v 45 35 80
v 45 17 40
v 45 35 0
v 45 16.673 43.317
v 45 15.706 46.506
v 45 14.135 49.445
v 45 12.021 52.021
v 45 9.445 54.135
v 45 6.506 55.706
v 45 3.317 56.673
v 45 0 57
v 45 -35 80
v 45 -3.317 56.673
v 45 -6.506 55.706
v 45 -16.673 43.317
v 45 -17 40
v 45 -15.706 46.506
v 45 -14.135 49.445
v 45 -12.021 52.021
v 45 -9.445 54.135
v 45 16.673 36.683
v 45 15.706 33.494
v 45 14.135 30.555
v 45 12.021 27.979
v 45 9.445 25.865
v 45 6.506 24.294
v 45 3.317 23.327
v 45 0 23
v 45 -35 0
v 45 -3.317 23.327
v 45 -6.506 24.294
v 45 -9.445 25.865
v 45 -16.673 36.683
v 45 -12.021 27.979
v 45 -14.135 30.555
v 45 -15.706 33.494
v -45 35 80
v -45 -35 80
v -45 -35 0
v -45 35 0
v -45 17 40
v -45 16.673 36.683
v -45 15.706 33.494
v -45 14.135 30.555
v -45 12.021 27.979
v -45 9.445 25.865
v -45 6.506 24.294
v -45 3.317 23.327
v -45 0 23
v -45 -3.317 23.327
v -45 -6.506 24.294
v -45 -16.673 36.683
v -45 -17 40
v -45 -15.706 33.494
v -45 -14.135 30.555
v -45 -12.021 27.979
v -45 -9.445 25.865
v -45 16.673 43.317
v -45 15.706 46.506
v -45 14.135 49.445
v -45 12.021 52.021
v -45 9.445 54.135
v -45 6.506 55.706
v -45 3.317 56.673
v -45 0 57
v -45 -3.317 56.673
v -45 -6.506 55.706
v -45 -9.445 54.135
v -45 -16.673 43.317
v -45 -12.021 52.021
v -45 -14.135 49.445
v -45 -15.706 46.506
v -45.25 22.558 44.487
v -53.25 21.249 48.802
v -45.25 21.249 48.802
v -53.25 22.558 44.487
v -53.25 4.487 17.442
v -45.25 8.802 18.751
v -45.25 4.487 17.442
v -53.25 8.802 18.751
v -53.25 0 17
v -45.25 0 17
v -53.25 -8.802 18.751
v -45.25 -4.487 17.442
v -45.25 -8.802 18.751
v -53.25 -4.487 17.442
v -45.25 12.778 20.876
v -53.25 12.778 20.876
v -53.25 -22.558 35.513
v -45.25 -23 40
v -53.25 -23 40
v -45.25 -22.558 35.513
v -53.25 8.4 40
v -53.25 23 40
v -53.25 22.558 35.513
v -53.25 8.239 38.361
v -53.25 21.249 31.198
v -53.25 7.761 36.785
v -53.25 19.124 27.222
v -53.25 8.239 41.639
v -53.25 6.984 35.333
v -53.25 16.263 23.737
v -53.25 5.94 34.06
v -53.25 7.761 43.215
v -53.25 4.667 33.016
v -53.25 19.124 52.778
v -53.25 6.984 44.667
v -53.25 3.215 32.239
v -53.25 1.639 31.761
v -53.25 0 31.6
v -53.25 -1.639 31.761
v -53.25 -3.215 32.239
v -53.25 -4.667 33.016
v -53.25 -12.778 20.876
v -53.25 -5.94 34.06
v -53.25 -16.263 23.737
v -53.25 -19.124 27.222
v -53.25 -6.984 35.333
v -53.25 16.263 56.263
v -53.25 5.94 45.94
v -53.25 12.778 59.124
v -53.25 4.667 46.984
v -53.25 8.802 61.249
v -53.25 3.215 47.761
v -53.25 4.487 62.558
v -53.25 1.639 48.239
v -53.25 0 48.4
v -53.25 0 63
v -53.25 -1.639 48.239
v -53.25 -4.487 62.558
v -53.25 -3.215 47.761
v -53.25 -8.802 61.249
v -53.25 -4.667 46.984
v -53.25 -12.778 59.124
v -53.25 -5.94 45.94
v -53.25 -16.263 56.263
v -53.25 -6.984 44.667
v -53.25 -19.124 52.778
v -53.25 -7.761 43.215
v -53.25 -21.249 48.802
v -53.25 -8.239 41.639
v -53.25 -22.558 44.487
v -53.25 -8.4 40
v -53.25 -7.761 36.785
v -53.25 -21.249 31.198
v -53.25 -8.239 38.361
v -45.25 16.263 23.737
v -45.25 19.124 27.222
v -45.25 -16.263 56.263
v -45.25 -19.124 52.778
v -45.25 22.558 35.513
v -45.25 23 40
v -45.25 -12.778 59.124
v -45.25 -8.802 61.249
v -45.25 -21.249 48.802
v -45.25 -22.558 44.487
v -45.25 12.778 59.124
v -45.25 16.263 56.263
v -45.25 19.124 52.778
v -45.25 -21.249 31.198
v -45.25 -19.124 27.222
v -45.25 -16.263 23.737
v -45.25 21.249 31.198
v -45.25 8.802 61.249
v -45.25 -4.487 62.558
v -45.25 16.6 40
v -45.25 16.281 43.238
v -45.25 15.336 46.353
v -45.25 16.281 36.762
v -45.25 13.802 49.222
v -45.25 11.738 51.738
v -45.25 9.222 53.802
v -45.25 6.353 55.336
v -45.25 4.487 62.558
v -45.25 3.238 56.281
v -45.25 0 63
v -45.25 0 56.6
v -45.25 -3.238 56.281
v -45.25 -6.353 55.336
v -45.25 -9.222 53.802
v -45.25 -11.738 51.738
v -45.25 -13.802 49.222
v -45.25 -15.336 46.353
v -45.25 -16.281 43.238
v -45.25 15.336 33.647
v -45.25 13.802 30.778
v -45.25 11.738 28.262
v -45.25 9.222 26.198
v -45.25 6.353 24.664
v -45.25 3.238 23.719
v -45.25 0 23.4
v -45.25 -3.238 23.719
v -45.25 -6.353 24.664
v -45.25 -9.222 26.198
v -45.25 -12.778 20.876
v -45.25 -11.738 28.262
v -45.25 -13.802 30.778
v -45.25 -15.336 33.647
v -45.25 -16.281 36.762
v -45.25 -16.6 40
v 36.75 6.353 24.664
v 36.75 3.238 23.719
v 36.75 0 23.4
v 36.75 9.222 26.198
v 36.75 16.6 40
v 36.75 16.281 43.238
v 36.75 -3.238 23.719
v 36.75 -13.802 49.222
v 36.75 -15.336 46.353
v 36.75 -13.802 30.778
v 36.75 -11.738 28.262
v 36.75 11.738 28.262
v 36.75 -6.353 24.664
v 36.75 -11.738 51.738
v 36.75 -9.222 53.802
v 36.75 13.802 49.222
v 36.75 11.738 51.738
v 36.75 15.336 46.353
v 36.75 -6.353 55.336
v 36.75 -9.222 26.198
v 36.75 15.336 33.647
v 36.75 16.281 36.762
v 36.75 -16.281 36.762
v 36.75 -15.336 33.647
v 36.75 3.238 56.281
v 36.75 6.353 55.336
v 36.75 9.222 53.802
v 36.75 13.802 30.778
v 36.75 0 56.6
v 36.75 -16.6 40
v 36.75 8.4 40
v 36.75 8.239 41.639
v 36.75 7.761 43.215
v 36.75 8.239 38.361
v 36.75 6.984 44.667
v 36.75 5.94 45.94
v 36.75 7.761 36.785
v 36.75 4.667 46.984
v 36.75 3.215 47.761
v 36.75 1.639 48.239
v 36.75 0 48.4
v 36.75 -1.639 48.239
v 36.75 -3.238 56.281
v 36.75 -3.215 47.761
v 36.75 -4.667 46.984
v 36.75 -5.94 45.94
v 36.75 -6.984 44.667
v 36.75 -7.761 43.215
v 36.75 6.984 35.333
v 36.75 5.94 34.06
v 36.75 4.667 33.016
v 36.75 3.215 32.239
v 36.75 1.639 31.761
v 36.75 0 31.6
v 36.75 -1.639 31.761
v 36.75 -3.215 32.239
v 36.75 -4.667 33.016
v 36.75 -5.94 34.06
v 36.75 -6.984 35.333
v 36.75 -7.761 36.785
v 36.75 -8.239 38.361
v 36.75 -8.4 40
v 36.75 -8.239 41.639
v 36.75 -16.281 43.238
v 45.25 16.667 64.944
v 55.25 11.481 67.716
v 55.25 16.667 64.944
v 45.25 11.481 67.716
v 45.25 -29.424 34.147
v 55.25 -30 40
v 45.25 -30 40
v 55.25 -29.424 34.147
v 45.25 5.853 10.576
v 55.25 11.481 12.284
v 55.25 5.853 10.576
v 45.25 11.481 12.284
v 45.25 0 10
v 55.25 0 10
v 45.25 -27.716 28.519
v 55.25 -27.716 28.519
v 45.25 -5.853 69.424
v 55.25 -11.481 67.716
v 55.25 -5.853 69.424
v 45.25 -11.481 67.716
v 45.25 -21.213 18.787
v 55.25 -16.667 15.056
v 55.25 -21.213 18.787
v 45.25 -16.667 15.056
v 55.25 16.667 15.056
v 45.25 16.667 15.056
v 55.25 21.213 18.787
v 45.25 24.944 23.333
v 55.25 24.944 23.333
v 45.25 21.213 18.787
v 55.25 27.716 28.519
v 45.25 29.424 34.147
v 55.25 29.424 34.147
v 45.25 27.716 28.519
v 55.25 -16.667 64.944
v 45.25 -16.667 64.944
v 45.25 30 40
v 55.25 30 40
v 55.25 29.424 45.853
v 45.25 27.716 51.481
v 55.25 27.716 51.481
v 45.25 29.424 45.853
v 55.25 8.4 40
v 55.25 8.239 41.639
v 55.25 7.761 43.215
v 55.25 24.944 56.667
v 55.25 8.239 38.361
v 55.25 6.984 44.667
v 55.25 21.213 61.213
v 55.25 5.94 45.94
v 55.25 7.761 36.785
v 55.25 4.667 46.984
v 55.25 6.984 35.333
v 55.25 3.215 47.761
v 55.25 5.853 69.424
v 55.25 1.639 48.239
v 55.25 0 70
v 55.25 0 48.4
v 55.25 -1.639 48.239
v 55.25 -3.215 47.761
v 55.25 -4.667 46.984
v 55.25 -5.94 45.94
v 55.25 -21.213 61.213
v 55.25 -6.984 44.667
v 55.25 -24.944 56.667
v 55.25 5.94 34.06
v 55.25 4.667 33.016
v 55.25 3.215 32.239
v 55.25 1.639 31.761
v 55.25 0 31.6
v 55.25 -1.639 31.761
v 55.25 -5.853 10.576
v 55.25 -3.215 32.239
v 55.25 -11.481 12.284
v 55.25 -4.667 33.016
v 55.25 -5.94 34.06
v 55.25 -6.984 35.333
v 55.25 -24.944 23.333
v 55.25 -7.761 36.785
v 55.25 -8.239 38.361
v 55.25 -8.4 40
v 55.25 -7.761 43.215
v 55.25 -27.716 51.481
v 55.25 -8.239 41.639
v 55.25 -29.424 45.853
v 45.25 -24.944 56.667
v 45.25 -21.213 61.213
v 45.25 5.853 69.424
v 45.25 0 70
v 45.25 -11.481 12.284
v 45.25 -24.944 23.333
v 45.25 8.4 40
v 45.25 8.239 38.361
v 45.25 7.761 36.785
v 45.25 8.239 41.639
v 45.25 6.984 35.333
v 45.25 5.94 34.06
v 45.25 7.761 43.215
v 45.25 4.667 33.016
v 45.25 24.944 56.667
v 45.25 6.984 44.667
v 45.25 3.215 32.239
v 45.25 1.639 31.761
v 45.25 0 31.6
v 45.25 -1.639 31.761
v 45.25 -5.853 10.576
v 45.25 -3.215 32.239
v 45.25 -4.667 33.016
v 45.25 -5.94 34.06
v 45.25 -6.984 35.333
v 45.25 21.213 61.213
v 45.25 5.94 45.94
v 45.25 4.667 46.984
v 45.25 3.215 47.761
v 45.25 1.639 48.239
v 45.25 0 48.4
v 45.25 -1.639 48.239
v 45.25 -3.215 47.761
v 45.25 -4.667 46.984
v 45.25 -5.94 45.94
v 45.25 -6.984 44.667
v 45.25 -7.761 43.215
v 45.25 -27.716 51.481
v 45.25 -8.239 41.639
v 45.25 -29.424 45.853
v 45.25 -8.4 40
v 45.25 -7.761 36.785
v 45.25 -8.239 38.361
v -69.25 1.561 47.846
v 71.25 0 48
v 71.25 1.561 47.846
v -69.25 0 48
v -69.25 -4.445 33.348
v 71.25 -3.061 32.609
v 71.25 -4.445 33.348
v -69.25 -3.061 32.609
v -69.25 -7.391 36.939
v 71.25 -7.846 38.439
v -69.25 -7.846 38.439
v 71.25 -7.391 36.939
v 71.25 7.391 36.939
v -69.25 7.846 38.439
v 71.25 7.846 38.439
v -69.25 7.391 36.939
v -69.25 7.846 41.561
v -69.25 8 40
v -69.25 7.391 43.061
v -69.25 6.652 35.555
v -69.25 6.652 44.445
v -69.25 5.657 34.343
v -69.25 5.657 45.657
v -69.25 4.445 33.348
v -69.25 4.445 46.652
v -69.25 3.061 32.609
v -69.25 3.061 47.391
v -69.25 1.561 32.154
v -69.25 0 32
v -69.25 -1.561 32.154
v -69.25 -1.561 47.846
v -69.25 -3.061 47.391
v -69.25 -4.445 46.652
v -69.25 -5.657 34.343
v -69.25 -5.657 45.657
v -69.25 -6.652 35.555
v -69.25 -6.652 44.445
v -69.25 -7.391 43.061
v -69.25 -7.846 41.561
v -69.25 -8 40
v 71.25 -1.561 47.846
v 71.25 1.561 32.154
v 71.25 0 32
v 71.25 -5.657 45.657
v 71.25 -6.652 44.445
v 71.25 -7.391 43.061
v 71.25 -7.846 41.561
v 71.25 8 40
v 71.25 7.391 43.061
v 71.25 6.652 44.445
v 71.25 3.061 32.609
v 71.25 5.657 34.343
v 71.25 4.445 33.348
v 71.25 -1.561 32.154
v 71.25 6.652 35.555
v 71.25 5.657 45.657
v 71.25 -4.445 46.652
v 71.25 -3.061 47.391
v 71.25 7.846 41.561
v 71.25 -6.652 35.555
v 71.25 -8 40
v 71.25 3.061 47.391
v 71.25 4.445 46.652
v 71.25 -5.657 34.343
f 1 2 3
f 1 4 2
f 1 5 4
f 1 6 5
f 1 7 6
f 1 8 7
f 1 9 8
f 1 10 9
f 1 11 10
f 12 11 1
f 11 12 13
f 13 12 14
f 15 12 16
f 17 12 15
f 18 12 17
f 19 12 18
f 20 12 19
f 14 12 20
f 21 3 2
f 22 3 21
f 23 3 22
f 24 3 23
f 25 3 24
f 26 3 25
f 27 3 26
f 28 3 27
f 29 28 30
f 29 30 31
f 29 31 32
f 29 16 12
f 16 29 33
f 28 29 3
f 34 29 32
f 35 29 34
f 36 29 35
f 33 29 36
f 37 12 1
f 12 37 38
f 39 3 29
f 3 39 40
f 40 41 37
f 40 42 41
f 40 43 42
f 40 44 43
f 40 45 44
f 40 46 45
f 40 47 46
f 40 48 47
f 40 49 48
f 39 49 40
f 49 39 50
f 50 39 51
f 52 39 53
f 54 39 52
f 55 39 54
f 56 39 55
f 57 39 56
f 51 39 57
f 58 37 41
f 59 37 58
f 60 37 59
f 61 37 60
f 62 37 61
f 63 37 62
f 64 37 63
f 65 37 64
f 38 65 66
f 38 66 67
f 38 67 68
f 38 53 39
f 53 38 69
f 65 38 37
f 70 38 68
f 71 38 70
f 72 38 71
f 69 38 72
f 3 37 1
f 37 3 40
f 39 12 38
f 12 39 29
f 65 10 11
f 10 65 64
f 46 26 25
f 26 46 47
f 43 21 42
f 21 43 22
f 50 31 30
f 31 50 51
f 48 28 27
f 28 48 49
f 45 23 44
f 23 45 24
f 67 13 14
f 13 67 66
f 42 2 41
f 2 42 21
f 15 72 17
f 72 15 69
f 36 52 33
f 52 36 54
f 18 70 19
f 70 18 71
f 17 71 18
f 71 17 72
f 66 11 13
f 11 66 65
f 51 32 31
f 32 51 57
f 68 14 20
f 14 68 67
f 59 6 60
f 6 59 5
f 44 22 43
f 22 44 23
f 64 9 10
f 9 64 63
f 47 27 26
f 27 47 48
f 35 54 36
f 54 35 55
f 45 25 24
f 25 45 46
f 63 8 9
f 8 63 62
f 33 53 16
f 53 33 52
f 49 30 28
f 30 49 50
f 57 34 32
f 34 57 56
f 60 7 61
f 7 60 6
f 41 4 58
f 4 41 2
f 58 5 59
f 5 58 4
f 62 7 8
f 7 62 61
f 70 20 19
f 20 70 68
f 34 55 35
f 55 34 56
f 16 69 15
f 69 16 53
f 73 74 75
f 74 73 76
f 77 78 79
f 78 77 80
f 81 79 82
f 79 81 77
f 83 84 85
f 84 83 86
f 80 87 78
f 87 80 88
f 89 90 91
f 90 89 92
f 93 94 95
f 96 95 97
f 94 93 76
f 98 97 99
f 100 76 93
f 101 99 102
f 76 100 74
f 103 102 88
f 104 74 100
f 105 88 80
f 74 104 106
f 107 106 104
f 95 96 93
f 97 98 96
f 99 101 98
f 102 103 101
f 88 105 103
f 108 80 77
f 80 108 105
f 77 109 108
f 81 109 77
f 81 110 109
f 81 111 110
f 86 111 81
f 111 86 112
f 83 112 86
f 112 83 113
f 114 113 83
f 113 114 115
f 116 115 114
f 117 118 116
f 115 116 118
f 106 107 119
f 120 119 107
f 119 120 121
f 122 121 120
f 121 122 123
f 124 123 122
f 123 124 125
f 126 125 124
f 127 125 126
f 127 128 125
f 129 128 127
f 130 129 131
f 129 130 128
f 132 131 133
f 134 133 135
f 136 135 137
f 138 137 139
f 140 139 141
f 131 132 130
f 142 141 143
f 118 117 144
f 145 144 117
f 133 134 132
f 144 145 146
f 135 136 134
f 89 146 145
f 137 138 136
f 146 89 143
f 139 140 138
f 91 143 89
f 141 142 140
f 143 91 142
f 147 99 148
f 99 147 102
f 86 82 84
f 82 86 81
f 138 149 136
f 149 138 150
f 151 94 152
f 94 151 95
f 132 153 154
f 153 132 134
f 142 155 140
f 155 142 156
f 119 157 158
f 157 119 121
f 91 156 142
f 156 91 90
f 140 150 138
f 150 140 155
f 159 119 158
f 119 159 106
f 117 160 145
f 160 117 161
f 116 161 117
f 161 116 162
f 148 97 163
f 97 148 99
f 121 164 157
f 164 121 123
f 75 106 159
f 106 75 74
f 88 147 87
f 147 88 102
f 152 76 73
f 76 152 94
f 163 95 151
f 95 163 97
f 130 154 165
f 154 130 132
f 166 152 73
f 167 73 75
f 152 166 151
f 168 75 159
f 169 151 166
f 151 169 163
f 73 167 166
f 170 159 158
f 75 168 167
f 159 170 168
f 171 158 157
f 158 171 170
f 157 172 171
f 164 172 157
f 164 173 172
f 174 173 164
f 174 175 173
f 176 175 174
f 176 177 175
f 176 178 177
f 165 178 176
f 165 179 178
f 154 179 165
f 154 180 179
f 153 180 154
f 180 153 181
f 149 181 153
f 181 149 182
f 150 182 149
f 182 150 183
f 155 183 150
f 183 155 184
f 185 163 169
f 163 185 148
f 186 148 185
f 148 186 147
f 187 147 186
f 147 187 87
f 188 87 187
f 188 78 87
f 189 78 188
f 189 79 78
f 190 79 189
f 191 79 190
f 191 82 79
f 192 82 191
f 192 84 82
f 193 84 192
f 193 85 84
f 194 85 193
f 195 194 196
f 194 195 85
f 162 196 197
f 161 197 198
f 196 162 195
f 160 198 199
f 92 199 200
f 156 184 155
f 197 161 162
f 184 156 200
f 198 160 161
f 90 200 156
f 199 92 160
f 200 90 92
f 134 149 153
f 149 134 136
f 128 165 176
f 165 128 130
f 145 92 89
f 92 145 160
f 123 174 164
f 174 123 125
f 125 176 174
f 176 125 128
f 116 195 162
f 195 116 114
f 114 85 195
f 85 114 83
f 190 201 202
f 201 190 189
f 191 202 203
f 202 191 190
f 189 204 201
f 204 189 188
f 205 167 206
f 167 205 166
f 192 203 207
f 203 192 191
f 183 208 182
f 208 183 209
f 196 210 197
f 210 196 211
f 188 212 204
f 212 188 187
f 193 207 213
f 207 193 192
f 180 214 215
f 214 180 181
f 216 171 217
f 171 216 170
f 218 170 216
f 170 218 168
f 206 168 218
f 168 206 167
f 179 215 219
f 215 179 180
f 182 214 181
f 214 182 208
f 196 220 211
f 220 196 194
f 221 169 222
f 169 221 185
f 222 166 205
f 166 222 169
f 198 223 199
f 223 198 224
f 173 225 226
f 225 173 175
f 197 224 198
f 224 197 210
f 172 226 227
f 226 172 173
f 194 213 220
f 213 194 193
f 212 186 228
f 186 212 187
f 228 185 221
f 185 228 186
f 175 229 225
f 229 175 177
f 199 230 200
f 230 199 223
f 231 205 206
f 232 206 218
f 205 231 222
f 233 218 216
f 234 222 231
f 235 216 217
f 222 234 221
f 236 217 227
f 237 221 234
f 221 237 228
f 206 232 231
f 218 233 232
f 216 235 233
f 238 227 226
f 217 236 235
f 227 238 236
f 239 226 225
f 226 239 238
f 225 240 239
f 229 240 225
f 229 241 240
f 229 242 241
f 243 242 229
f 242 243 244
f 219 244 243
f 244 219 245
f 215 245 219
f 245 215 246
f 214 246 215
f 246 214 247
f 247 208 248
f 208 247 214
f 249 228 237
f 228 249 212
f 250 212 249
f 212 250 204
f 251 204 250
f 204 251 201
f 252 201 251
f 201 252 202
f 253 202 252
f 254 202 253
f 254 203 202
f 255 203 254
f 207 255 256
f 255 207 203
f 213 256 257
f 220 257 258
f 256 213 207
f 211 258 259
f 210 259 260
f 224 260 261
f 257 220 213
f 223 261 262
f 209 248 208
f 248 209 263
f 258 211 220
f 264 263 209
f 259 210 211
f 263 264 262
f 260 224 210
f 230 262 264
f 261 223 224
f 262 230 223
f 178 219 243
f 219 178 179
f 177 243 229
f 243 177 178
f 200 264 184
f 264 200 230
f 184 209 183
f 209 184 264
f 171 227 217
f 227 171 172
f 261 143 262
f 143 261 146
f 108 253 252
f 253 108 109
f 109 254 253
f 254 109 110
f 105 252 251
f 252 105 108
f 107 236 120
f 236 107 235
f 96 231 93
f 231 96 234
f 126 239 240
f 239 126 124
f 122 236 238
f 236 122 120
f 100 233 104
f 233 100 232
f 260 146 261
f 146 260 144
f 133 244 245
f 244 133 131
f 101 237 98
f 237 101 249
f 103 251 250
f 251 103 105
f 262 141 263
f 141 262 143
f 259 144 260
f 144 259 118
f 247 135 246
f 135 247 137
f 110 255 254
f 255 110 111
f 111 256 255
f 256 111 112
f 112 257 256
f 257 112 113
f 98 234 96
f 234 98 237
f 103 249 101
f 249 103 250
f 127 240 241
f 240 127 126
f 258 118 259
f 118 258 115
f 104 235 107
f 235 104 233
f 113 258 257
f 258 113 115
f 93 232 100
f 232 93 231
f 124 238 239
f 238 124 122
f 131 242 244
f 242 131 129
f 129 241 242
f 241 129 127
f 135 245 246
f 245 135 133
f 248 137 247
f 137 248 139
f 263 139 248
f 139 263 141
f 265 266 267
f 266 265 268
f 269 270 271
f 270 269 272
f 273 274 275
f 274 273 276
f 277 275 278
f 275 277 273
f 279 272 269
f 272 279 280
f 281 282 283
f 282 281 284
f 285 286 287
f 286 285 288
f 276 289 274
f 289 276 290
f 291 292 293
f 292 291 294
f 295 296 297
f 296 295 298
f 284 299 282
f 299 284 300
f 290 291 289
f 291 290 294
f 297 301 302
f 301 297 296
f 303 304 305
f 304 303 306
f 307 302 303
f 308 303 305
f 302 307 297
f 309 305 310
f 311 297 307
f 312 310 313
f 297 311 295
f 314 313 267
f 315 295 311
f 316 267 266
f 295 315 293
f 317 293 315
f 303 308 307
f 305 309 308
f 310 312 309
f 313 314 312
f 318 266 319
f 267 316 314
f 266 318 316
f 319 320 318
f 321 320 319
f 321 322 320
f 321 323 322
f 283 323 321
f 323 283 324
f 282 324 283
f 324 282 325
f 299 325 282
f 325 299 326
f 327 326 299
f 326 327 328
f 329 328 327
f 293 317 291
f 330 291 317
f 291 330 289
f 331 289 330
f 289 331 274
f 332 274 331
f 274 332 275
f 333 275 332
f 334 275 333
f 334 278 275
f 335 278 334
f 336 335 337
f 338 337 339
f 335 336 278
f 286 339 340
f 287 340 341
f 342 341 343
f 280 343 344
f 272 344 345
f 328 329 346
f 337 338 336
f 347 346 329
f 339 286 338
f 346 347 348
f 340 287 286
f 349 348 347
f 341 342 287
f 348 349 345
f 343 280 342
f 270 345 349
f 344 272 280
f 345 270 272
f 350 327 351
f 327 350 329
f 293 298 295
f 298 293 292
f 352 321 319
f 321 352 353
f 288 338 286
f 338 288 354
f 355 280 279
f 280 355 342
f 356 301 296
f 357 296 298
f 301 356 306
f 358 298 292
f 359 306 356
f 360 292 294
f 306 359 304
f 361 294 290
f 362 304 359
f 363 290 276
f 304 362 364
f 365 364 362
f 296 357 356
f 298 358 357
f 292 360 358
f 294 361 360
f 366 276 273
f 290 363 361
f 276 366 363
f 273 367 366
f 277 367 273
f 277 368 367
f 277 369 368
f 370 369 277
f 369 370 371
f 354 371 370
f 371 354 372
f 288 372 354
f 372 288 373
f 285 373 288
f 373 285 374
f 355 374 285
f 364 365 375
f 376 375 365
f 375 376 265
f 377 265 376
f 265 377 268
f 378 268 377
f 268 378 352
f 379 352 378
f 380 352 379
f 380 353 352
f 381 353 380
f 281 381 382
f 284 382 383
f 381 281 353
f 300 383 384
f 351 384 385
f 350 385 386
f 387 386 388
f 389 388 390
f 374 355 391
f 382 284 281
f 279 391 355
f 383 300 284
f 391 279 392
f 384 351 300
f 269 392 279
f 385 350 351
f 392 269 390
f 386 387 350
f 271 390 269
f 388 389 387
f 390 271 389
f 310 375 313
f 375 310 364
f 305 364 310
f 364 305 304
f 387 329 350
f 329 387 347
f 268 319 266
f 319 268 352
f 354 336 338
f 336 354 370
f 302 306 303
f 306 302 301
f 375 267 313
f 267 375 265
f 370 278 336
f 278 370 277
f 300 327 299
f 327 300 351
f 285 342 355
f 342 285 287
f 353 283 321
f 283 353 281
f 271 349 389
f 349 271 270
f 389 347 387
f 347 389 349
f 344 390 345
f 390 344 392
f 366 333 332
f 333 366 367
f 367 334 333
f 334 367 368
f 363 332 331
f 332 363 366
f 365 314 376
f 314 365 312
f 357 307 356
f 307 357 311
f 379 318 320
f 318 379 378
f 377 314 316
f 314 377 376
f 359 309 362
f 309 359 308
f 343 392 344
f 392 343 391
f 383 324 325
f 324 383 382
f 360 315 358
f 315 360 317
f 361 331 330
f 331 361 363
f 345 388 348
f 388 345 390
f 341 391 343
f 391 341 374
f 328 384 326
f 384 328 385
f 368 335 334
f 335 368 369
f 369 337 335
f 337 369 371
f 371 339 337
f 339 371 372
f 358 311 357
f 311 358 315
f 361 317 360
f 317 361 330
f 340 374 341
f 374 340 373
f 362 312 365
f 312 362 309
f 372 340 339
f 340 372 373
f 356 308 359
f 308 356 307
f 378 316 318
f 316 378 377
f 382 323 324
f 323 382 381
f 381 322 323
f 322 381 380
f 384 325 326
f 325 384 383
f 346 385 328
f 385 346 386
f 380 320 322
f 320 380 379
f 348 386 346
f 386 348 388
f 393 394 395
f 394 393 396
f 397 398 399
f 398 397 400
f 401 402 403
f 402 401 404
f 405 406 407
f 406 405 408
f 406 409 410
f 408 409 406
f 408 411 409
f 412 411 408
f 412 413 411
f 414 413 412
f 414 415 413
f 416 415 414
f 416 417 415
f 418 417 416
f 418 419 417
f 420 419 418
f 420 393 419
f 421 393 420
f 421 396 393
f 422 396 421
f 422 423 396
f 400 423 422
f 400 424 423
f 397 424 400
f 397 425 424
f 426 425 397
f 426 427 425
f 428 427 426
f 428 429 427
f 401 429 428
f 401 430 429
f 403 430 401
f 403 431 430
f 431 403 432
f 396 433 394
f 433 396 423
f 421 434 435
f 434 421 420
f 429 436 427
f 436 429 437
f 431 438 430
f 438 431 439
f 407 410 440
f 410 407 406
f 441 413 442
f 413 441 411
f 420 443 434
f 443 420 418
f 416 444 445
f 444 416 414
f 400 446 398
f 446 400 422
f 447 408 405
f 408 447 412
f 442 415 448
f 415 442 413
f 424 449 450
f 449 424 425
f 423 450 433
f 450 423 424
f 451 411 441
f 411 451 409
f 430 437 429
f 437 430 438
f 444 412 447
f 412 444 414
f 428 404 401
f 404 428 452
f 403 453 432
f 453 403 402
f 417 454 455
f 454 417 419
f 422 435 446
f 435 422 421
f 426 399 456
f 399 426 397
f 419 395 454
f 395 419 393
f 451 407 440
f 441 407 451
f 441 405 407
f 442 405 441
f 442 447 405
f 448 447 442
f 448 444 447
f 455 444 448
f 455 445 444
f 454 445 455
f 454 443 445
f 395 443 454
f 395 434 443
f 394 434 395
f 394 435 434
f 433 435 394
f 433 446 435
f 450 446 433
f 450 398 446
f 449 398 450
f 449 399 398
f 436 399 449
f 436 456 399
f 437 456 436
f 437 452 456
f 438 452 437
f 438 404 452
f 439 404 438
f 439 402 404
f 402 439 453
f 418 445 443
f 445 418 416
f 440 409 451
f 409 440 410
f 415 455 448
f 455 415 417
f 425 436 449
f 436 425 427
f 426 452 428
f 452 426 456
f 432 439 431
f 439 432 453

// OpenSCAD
$fn = 32;

// ------------------------------------------------------------------------
// Bushed housing: 90 x 70 x 80 mm housing, bushing d33.2
// Every part is its own module, assembly() places them once.
// ------------------------------------------------------------------------

// --- part 1 ---
module housing() {
  difference() {
    translate([-45, -35, 0]) cube([90, 70, 80]);
    translate([0, 0, 40]) rotate([0, 90, 0]) cylinder(h = 92, d = 34, center = true);
  }
}

// --- part 2 ---
module bushing() {
  difference() {
    union() {
      cylinder(h = 8, d = 46);
      translate([0, 0, 8]) cylinder(h = 82, d = 33.2);
    }
    translate([0, 0, -1]) cylinder(h = 92, d = 16.8);
  }
}

// --- part 3 ---
module shaft() {
  translate([0, 0, -70.25]) cylinder(h = 140.5, d = 16);
}

// --- part 4 ---
module cover() {
  difference() {
    cylinder(h = 10, d = 60);
    translate([0, 0, -1]) cylinder(h = 12, d = 16.8);
  }
}

// --- assembly ---
module assembly() {
  translate([0, 0, 0]) rotate([0, 0, 0]) housing();
  translate([-53.25, 0, 40]) rotate([0, 90, 0]) bushing();
  translate([1, 0, 40]) rotate([0, 90, 0]) shaft();
  translate([45.25, 0, 40]) rotate([0, 90, 0]) cover();
}

assembly();
